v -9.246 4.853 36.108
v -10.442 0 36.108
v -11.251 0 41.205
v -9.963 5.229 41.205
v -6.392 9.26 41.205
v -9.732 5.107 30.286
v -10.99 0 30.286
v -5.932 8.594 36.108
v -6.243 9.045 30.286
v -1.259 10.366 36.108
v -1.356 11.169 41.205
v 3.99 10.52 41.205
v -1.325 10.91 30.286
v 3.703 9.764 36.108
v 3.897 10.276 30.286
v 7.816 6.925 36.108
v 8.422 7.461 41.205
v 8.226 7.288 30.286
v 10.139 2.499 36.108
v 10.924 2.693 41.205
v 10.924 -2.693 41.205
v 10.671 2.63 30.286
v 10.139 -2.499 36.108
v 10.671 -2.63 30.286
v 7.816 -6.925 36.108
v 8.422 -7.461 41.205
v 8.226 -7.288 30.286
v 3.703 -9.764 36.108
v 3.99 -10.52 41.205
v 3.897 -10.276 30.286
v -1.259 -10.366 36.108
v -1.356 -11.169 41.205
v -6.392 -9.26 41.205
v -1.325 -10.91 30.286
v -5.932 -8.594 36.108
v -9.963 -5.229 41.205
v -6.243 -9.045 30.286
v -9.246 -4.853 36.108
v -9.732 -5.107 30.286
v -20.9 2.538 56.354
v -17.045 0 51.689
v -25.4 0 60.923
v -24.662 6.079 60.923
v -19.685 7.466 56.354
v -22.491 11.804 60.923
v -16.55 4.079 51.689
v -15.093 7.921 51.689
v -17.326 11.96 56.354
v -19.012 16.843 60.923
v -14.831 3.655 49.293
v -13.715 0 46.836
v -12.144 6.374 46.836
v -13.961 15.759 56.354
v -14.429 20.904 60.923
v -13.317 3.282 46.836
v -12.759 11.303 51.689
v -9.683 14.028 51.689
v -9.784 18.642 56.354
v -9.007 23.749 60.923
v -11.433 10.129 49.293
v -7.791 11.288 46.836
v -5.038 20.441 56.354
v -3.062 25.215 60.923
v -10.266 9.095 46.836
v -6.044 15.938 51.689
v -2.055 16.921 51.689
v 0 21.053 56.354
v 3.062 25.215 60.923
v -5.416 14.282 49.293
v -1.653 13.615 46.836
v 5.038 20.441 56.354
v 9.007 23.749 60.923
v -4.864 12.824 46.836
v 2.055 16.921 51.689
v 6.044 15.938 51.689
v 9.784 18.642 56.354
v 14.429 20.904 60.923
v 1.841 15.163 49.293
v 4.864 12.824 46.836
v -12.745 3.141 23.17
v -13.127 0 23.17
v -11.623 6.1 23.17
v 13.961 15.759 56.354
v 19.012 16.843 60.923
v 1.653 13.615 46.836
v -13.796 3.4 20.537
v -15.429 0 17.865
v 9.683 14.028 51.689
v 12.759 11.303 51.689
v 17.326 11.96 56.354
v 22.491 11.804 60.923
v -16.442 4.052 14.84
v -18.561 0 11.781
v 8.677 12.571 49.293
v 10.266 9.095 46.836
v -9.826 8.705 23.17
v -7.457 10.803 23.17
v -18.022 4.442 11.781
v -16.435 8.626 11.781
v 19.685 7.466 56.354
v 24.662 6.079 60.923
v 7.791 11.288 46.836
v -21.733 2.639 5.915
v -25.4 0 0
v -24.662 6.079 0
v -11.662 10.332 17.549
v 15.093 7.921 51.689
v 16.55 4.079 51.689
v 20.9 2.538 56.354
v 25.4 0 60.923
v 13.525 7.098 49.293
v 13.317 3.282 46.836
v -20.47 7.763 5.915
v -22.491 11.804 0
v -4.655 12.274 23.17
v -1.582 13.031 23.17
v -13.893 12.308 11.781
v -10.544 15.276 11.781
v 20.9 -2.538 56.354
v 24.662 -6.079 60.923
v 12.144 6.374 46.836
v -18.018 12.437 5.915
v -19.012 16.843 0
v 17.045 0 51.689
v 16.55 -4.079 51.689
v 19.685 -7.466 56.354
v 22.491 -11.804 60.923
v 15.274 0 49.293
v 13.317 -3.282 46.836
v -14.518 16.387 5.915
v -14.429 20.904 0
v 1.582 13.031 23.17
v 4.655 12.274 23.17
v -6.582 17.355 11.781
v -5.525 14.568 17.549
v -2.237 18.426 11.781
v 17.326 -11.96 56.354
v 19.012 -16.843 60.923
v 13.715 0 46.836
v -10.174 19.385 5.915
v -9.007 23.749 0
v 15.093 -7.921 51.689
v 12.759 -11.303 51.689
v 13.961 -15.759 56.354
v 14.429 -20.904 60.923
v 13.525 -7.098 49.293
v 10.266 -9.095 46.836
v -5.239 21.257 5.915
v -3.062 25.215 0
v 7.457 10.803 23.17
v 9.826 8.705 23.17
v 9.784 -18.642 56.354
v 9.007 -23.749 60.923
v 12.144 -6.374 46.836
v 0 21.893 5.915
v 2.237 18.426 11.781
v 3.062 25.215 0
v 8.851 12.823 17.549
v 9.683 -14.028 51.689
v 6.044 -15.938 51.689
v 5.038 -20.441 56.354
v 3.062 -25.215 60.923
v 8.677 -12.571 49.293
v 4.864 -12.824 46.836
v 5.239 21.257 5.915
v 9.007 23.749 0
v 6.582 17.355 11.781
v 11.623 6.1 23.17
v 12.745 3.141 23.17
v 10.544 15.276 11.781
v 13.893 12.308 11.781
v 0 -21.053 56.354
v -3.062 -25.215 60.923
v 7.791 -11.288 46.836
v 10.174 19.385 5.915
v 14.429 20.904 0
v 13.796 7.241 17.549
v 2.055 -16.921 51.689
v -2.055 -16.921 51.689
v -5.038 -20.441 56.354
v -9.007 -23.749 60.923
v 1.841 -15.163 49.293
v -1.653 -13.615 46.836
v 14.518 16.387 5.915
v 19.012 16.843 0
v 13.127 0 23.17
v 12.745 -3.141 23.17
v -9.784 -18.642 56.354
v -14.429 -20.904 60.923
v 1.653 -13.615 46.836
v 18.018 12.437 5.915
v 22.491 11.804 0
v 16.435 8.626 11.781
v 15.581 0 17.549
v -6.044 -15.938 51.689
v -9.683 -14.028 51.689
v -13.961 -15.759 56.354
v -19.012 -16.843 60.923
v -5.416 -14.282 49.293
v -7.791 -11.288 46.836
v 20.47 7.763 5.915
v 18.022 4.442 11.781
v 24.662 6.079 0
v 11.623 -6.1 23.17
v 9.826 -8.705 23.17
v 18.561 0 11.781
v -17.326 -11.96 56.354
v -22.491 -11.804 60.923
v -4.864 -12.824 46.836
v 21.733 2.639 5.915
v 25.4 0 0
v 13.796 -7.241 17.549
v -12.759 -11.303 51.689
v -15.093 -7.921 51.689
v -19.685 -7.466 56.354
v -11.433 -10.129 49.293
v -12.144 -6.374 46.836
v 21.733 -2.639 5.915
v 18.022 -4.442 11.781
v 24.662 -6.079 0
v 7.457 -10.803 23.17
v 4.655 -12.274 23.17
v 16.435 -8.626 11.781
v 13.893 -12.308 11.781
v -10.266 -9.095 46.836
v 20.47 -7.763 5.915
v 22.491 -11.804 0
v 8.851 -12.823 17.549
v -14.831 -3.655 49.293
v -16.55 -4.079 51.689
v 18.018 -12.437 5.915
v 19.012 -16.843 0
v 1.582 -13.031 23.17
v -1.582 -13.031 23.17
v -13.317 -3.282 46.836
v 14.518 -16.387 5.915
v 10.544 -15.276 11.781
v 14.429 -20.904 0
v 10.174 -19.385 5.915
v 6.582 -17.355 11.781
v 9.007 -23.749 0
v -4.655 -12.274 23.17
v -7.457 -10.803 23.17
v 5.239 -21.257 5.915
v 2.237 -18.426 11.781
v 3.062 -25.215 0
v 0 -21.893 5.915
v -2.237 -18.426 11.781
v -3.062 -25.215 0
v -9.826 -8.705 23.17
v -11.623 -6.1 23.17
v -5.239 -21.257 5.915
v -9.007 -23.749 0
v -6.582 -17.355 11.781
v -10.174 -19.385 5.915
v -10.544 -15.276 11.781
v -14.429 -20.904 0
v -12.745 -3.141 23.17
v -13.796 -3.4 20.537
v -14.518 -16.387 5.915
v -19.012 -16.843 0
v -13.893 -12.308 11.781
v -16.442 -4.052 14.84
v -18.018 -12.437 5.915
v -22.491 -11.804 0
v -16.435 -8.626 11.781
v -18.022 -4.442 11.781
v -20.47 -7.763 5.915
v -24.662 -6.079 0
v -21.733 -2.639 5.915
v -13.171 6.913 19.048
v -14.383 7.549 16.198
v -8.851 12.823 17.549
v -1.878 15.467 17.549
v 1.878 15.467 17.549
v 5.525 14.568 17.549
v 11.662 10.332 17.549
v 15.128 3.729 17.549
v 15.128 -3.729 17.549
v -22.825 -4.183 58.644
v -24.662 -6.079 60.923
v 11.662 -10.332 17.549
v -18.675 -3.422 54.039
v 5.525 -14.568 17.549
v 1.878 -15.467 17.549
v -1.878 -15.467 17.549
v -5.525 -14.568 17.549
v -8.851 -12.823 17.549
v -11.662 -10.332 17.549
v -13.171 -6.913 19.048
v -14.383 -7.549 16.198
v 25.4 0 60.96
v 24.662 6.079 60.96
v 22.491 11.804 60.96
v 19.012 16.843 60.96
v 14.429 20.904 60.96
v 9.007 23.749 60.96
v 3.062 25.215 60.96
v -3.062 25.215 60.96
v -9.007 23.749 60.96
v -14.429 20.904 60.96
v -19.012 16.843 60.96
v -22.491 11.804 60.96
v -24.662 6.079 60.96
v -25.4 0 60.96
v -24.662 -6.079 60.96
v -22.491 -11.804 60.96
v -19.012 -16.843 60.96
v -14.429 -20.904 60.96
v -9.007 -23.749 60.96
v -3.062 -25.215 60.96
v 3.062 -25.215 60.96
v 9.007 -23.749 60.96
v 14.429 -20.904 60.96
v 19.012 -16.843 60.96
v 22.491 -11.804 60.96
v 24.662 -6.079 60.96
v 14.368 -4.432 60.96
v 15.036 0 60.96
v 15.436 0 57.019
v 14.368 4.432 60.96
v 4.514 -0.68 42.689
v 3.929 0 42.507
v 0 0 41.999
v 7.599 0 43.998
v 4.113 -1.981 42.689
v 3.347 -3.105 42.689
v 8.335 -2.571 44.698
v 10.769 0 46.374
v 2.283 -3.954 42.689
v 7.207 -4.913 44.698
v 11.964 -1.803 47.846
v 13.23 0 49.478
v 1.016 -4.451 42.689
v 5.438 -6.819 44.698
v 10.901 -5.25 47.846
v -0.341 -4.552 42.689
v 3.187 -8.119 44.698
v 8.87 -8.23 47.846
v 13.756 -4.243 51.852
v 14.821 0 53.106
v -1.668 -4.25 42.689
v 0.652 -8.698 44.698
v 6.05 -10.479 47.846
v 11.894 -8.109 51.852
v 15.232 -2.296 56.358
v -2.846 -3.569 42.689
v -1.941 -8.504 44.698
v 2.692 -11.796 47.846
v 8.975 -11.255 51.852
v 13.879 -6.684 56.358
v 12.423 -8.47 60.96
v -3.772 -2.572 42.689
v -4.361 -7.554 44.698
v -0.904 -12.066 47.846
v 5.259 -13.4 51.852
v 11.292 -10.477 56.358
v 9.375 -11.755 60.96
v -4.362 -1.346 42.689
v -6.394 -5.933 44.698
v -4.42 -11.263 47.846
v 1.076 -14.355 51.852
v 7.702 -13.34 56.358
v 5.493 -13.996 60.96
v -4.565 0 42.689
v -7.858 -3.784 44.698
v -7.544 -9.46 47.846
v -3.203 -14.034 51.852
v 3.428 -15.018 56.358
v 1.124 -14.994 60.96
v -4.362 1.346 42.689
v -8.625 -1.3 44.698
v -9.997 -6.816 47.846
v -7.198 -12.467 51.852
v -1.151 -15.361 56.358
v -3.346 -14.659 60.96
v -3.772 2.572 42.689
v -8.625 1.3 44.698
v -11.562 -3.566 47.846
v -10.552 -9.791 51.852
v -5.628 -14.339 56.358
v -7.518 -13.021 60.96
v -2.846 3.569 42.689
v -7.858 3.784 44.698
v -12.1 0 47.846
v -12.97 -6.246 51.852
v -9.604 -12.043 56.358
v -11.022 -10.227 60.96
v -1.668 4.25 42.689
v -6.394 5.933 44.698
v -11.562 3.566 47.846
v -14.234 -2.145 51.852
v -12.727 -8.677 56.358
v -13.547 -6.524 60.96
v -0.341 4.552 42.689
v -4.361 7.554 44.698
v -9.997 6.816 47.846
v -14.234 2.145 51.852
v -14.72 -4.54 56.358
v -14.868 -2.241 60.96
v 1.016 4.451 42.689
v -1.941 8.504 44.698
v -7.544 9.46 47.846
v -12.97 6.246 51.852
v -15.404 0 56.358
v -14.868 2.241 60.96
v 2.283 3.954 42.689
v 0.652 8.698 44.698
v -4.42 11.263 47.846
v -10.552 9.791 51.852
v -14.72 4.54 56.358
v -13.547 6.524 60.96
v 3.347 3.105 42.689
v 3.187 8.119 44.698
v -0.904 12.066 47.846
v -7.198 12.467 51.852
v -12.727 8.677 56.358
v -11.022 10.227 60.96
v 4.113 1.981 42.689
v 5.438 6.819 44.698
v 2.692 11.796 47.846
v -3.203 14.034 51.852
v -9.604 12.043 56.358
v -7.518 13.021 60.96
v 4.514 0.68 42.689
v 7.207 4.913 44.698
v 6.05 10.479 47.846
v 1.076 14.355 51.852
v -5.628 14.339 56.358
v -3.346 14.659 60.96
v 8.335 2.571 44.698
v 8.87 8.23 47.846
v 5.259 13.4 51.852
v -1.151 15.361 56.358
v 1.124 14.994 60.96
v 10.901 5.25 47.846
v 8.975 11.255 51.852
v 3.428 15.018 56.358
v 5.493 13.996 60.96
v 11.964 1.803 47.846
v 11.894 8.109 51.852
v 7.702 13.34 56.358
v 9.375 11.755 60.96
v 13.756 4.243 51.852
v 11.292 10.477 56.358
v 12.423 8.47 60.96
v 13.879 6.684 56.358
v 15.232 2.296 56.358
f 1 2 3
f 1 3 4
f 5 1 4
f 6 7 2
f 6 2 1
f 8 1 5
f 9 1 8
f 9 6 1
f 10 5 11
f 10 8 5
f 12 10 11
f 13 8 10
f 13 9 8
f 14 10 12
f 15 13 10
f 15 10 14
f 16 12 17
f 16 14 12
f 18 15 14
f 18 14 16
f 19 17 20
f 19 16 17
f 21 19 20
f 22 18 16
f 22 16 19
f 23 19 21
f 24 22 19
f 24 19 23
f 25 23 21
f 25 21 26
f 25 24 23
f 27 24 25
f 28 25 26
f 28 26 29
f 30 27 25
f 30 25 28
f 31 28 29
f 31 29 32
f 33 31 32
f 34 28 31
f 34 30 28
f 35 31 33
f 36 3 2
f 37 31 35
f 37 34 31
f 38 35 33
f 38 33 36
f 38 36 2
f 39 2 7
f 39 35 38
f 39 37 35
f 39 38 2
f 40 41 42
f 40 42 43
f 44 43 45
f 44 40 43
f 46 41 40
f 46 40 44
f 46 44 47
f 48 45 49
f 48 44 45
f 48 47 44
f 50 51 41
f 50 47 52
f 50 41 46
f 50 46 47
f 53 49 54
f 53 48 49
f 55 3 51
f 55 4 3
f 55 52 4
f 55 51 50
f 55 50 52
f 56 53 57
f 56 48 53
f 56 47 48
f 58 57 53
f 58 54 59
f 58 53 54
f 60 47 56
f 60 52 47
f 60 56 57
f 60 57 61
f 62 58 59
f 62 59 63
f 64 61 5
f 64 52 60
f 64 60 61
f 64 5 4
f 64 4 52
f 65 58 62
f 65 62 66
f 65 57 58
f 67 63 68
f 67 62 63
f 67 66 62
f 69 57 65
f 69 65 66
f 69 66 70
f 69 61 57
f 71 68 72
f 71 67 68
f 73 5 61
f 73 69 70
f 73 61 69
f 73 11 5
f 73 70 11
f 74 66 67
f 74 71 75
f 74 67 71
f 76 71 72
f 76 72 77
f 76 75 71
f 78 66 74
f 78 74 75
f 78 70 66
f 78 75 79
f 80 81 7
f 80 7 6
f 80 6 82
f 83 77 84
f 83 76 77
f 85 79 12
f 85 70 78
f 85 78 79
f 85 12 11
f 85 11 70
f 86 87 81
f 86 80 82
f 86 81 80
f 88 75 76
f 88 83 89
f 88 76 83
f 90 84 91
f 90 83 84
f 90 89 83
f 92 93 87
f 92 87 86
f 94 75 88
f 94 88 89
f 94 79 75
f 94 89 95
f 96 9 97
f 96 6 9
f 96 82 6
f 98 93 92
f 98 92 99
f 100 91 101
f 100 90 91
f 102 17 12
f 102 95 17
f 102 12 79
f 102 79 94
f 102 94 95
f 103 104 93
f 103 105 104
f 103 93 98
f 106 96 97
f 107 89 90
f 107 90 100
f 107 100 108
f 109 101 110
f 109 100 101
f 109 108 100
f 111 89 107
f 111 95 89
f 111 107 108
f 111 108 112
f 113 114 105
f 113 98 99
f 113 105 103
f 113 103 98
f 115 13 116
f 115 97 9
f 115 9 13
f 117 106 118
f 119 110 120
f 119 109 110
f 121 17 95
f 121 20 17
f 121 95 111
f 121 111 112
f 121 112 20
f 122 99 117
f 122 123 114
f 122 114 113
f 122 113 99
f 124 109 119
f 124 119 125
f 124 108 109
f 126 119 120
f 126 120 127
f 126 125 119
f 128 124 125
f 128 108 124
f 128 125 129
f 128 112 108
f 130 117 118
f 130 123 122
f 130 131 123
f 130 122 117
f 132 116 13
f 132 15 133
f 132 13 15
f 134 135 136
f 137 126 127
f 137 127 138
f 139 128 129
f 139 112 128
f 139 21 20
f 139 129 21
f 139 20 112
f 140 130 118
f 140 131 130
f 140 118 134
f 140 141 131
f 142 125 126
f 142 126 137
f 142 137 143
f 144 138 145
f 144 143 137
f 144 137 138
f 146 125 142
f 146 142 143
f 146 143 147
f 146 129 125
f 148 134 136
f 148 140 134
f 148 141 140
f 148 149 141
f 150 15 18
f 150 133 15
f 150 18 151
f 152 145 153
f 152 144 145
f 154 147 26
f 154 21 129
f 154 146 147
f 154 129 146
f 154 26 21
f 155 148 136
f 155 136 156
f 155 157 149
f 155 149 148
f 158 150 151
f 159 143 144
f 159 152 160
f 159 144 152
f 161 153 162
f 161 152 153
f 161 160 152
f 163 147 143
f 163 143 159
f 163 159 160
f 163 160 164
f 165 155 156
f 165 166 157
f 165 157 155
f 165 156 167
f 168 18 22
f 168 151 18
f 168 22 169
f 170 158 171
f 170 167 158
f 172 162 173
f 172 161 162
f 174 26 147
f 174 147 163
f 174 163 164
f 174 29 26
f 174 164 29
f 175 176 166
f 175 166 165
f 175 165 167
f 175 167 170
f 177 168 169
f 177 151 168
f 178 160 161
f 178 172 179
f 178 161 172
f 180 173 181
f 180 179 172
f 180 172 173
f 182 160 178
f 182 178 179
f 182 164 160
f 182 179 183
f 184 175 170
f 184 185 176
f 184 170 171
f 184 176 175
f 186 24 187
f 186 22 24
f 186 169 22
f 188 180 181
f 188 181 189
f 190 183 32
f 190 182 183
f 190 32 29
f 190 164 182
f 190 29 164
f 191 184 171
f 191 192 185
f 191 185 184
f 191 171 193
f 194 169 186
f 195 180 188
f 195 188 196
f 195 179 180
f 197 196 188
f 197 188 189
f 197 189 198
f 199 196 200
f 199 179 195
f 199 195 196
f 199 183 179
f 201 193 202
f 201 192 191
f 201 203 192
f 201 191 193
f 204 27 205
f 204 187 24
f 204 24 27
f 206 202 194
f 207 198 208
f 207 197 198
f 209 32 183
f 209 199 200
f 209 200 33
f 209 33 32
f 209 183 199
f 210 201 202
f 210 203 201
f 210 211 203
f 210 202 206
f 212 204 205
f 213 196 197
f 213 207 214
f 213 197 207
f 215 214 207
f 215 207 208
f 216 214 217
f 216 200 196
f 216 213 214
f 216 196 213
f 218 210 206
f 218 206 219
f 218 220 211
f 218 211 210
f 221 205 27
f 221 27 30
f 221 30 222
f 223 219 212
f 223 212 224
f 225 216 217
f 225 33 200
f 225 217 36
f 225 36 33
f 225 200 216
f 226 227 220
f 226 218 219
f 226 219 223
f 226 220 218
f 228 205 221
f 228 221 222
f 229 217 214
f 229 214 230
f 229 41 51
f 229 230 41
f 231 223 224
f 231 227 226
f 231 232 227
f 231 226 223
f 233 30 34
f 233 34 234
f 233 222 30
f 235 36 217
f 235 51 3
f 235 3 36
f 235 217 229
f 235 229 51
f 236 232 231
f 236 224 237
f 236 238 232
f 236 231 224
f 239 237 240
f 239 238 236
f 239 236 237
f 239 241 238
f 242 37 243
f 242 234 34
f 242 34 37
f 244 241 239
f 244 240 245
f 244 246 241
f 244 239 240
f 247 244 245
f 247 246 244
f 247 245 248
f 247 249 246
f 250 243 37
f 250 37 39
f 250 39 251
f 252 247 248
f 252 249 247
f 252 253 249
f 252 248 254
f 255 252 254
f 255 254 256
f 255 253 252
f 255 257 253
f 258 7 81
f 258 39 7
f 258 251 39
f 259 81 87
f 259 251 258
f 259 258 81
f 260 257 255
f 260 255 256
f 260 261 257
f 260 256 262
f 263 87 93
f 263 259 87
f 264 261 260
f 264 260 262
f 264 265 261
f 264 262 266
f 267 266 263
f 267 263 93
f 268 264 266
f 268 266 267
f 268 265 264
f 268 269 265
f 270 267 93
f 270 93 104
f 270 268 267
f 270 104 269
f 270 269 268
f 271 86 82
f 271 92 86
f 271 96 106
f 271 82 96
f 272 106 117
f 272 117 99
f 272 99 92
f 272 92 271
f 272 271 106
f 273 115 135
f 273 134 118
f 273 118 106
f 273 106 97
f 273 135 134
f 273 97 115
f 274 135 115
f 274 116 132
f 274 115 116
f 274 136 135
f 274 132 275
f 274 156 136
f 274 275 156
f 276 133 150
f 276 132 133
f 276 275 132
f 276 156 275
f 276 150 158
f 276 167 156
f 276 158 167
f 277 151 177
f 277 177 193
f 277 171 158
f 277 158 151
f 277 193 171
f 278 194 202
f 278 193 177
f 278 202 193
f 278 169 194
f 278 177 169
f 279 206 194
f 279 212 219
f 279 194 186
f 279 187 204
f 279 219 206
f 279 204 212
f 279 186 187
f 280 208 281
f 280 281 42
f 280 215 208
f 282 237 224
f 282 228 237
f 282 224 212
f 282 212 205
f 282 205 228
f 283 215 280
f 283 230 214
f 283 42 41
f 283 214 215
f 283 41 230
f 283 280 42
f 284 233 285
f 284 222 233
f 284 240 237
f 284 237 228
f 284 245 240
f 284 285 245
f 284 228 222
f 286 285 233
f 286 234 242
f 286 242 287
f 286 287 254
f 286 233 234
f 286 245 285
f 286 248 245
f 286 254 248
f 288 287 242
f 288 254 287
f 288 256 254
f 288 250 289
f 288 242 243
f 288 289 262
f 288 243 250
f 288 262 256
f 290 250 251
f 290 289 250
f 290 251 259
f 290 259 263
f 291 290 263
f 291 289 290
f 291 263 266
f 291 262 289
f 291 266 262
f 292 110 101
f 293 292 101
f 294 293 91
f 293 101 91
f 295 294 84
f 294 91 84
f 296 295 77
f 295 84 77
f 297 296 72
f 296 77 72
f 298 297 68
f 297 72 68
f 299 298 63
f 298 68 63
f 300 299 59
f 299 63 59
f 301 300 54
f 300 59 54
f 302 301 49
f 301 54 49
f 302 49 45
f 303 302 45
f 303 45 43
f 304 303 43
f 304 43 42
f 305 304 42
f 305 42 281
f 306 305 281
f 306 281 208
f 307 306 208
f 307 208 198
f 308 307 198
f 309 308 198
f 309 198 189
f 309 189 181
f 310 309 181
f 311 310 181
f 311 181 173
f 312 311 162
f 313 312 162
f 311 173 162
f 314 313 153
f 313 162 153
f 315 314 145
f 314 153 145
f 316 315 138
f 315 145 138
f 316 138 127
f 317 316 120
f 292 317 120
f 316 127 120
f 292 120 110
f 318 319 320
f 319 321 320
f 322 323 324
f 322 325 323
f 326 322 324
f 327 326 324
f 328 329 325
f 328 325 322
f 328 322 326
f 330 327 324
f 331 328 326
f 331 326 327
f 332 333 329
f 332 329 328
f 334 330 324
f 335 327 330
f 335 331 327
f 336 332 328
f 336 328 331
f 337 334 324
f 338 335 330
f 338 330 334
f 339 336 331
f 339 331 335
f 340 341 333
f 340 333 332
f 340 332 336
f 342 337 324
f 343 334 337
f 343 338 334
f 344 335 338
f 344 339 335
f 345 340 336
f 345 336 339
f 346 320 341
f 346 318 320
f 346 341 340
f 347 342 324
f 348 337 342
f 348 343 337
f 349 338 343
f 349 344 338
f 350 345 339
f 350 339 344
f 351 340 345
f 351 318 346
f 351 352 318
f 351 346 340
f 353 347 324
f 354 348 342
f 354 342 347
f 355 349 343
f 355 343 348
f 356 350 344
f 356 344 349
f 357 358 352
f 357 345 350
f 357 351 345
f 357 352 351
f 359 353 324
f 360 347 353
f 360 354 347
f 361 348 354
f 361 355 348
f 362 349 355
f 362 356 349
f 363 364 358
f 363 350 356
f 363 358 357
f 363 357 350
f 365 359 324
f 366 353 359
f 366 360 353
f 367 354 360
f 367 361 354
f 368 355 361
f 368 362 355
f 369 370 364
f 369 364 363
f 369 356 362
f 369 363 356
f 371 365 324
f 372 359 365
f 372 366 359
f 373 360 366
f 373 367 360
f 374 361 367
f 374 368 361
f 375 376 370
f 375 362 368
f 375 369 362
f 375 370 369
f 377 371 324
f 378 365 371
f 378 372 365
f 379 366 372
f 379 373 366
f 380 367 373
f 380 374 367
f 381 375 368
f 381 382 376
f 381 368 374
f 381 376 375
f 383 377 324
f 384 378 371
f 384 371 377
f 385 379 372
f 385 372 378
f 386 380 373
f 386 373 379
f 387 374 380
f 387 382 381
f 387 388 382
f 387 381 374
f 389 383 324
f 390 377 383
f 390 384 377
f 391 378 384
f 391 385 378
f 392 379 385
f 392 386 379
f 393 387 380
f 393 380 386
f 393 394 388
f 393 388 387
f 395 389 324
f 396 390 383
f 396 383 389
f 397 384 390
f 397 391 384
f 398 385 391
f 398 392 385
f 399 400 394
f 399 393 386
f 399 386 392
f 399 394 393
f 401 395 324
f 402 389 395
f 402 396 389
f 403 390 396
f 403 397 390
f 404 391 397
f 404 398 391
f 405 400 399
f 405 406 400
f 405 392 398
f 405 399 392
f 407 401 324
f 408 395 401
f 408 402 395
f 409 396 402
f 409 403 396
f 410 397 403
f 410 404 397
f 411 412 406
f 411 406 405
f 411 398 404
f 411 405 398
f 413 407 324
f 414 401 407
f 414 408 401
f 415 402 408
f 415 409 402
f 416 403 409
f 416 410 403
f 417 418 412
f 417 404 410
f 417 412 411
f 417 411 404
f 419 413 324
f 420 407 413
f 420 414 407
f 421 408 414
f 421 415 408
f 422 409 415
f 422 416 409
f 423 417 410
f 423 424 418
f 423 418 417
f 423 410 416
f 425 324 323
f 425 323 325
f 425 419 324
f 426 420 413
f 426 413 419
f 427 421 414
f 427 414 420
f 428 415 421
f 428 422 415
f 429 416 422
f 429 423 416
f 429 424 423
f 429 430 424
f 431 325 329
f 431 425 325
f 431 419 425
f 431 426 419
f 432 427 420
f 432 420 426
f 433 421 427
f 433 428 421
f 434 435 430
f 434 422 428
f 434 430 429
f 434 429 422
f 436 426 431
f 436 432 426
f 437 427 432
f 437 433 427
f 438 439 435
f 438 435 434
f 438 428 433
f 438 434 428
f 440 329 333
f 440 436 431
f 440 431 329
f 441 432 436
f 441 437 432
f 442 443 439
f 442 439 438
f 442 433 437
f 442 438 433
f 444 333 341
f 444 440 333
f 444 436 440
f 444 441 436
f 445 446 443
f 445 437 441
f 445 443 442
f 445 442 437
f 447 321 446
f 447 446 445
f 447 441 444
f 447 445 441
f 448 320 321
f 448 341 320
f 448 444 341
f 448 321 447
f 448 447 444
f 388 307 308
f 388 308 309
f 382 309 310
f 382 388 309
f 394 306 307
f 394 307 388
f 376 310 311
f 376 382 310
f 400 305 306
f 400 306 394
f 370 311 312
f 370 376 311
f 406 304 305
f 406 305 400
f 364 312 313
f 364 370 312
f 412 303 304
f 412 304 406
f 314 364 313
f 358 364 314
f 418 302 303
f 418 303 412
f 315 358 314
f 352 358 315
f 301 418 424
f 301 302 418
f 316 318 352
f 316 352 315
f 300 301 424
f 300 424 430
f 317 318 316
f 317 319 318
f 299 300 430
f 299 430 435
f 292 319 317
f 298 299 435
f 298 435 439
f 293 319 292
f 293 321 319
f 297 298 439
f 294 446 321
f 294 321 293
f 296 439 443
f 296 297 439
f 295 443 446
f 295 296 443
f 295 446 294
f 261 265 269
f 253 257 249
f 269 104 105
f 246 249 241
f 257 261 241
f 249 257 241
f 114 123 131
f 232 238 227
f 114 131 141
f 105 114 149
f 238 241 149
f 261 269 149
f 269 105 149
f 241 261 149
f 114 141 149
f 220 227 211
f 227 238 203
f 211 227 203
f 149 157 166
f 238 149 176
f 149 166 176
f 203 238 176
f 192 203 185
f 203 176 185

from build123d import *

# Parameters (mm, degrees)
F0_R     = 25.4
F1_DEPTH = 60.96


with BuildPart() as f1:
    # F0 (on Top) → F1 (new body)
    with BuildSketch(Plane.XY):
        Circle(F0_R)
    extrude(amount=F1_DEPTH)

    # F2 (on Front) → F3 (revolve, cut)
    with BuildSketch(Plane.XZ):
        with BuildLine():
            add(Edge.make_bspline(
                [(-25.4, 60.9230482654), (-18.379099245, 53.6623140881), (-2.9113509989, 37.6661887682), (-17.4568095535, 13.3040322149), (-25.4, 0)],
                knots=[0, 0, 0, 0, 0.4539058073, 1, 1, 1, 1], degree=3))
            Line((-25.4, 60.9230482654), (-25.4, 0))
        make_face()
    revolve(axis=Axis((0, 0, 25.251085345), (0, 0, -1)), mode=Mode.SUBTRACT)

    # F4 (on Front) → F5 (revolve, cut)
    with BuildSketch(Plane.XZ):
        with BuildLine():
            Line((0, 72.8829205036), (0, 41.9988818467))
            ThreePointArc((0, 41.9988818467), (15.4420193285, 57.4409011751), (0, 72.8829205036))
        make_face()
    revolve(axis=Axis((0, 0, 57.4409011751), (0, 0, -1)), mode=Mode.SUBTRACT)


solid = f1.part
